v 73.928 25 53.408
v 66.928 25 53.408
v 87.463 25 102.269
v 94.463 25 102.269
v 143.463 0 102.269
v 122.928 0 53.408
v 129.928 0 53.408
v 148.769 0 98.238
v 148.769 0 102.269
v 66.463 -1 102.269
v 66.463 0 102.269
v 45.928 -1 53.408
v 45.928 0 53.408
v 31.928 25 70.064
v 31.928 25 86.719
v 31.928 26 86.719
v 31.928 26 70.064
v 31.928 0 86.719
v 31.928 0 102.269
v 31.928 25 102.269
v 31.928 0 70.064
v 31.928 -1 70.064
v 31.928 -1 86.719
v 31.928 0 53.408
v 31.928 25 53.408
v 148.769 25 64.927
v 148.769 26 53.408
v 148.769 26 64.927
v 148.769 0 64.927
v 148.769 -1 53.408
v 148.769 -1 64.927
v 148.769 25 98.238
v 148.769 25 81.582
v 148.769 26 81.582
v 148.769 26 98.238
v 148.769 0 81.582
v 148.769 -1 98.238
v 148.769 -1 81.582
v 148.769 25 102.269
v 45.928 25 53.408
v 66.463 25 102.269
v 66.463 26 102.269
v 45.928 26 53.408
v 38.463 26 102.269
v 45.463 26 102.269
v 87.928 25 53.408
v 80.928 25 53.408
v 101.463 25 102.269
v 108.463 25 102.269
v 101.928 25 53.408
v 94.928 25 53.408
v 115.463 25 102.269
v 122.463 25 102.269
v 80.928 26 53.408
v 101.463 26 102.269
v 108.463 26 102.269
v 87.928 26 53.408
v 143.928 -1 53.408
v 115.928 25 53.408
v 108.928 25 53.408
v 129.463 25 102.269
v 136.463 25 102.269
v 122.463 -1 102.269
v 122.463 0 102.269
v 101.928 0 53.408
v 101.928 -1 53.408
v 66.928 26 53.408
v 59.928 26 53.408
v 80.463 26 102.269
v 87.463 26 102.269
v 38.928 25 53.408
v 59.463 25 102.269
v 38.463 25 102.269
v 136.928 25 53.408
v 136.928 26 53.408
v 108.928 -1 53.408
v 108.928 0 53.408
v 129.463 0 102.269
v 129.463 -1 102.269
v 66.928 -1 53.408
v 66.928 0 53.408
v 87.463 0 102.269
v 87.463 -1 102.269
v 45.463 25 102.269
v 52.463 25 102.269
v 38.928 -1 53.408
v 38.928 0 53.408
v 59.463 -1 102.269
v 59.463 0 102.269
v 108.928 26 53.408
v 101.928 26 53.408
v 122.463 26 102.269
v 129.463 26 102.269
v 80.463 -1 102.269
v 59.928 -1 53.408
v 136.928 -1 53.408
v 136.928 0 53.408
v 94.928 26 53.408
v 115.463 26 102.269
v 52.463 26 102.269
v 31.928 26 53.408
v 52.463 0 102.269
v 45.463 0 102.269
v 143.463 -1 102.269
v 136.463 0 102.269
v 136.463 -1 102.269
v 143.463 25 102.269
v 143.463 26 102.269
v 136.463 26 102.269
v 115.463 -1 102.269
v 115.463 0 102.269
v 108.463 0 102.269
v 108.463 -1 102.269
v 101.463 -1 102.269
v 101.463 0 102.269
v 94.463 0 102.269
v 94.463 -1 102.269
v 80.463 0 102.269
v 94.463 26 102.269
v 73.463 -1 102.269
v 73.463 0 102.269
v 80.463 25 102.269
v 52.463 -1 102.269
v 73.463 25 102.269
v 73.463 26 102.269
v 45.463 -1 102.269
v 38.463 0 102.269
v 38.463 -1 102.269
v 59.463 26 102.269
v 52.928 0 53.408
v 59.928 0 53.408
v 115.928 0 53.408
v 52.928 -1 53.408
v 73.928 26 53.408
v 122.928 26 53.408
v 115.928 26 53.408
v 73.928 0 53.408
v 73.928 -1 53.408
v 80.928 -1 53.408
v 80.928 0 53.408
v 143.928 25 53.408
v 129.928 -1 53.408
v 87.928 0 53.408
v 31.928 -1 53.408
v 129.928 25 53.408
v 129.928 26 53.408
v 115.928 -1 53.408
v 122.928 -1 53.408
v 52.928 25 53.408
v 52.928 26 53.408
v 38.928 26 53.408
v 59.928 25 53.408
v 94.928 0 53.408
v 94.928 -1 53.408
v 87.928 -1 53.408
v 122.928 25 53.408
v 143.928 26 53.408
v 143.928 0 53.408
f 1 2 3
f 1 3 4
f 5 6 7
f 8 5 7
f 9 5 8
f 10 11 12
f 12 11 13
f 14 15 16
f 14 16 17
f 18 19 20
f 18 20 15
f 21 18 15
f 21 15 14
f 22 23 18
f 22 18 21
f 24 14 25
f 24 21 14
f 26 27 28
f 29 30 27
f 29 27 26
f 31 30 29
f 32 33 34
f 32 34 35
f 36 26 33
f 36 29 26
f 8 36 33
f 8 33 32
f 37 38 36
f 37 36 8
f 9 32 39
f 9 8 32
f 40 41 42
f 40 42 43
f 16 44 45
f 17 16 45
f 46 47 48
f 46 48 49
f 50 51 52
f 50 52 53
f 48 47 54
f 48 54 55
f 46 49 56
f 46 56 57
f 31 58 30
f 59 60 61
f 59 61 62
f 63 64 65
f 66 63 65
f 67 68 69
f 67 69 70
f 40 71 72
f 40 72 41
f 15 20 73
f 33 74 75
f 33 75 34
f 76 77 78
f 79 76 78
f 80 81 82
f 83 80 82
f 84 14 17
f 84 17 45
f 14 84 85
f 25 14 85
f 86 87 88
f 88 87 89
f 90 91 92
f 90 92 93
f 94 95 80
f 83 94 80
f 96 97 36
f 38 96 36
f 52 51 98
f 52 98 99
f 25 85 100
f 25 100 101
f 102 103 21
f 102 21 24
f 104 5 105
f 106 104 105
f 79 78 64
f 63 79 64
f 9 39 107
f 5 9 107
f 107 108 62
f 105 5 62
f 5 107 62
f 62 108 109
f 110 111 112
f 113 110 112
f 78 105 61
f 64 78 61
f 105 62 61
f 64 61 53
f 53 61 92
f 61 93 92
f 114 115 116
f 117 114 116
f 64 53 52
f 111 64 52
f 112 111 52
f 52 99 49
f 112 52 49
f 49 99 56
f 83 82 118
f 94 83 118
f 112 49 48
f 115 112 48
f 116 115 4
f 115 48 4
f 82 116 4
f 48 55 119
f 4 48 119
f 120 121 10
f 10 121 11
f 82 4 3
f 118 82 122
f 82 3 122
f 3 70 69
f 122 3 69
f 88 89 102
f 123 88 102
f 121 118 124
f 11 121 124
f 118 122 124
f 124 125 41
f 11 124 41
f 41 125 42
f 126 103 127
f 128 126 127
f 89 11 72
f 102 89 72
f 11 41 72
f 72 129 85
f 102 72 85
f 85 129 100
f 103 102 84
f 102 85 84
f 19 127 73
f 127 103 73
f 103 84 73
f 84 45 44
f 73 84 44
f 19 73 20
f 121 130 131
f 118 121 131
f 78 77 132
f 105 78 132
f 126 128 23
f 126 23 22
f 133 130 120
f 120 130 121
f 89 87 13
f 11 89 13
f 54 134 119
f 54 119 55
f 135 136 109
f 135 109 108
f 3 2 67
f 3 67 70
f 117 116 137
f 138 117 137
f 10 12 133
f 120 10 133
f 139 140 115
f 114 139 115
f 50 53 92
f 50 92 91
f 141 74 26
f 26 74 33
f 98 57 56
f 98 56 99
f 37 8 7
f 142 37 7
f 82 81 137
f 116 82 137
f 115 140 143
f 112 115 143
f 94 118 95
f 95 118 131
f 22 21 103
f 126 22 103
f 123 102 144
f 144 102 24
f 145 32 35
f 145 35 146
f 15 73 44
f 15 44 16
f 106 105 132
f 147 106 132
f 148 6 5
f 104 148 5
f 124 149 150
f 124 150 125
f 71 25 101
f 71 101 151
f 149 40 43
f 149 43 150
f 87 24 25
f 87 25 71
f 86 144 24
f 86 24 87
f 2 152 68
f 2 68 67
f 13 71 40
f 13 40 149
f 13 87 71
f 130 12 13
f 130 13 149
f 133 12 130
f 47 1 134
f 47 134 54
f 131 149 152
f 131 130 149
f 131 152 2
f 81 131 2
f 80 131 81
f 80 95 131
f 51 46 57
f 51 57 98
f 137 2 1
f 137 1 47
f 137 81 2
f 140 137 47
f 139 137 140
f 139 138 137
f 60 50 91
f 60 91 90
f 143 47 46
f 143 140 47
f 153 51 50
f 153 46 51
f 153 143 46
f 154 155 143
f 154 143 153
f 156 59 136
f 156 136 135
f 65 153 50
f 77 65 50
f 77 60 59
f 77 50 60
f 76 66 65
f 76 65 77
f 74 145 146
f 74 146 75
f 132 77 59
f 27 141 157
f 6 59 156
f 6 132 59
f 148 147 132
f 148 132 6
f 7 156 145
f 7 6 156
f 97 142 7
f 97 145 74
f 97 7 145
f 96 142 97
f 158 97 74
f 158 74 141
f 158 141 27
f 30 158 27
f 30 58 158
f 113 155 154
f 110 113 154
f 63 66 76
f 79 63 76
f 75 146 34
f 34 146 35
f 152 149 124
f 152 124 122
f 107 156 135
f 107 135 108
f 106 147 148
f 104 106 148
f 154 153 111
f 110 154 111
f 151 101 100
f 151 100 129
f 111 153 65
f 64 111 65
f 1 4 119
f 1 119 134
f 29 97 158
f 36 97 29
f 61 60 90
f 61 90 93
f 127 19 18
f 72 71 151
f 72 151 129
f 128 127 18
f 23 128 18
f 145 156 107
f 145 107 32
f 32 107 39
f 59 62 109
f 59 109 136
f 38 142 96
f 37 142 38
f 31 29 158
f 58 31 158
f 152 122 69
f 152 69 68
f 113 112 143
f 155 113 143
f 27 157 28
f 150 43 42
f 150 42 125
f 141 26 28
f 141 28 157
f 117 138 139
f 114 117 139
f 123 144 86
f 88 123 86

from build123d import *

# Parameters (mm, degrees)
F1_DEPTH      = 25
F2_DEPTH      = 1
F2_DEPTH_BACK = 26


with BuildPart() as f1:
    # F0 (on Front) → F1 (new body)
    with BuildSketch(Plane.XZ):
        Polygon((148.768574, 98.237524), (129.927574, 53.408206), (136.927574, 53.408206), (148.768574, 81.58208), align=None)
        Polygon((136.463021, 102.269206), (129.463021, 102.269206), (108.927574, 53.408206), (115.927574, 53.408206), align=None)
        Polygon((148.768574, 102.269206), (143.463021, 102.269206), (122.927574, 53.408206), (129.927574, 53.408206), (148.768574, 98.237524), align=None)
        Polygon((115.463021, 102.269206), (108.463021, 102.269206), (87.927574, 53.408206), (94.927574, 53.408206), align=None)
        Polygon((108.463021, 102.269206), (101.463021, 102.269206), (80.927574, 53.408206), (87.927574, 53.408206), align=None)
        Polygon((101.463021, 102.269206), (94.463021, 102.269206), (73.927574, 53.408206), (80.927574, 53.408206), align=None)
        Polygon((94.463021, 102.269206), (87.463021, 102.269206), (66.927574, 53.408206), (73.927574, 53.408206), align=None)
        Polygon((87.463021, 102.269206), (80.463021, 102.269206), (59.927574, 53.408206), (66.927574, 53.408206), align=None)
        Polygon((80.463021, 102.269206), (73.463021, 102.269206), (52.927574, 53.408206), (59.927574, 53.408206), align=None)
        Polygon((73.463021, 102.269206), (66.463021, 102.269206), (45.927574, 53.408206), (52.927574, 53.408206), align=None)
        Polygon((66.463021, 102.269206), (59.463021, 102.269206), (38.927574, 53.408206), (45.927574, 53.408206), align=None)
        Polygon((59.463021, 102.269206), (52.463021, 102.269206), (31.927574, 53.408206), (38.927574, 53.408206), align=None)
        Polygon((52.463021, 102.269206), (45.463021, 102.269206), (31.927574, 70.06365), (31.927574, 53.408206), align=None)
        Polygon((45.463021, 102.269206), (38.463021, 102.269206), (31.927574, 86.719095), (31.927574, 70.06365), align=None)
        Polygon((148.768574, 64.926635), (143.927574, 53.408206), (148.768574, 53.408206), align=None)
        Polygon((38.463021, 102.269206), (31.927574, 102.269206), (31.927574, 86.719095), align=None)
        Polygon((143.463021, 102.269206), (136.463021, 102.269206), (115.927574, 53.408206), (122.927574, 53.408206), align=None)
        Polygon((129.463021, 102.269206), (122.463021, 102.269206), (101.927574, 53.408206), (108.927574, 53.408206), align=None)
        Polygon((122.463021, 102.269206), (115.463021, 102.269206), (94.927574, 53.408206), (101.927574, 53.408206), align=None)
        Polygon((148.768574, 81.58208), (136.927574, 53.408206), (143.927574, 53.408206), (148.768574, 64.926635), align=None)
    extrude(amount=-F1_DEPTH)

    # F0 (on Front) → F2 (join, two sides)
    with BuildSketch(Plane.XZ) as f2_sk:
        Polygon((45.463021, 102.269206), (38.463021, 102.269206), (31.927574, 86.719095), (31.927574, 70.06365), align=None)
        Polygon((59.463021, 102.269206), (52.463021, 102.269206), (31.927574, 53.408206), (38.927574, 53.408206), align=None)
        Polygon((73.463021, 102.269206), (66.463021, 102.269206), (45.927574, 53.408206), (52.927574, 53.408206), align=None)
        Polygon((87.463021, 102.269206), (80.463021, 102.269206), (59.927574, 53.408206), (66.927574, 53.408206), align=None)
        Polygon((101.463021, 102.269206), (94.463021, 102.269206), (73.927574, 53.408206), (80.927574, 53.408206), align=None)
        Polygon((115.463021, 102.269206), (108.463021, 102.269206), (87.927574, 53.408206), (94.927574, 53.408206), align=None)
        Polygon((129.463021, 102.269206), (122.463021, 102.269206), (101.927574, 53.408206), (108.927574, 53.408206), align=None)
        Polygon((143.463021, 102.269206), (136.463021, 102.269206), (115.927574, 53.408206), (122.927574, 53.408206), align=None)
        Polygon((148.768574, 98.237524), (129.927574, 53.408206), (136.927574, 53.408206), (148.768574, 81.58208), align=None)
        Polygon((148.768574, 64.926635), (143.927574, 53.408206), (148.768574, 53.408206), align=None)
    extrude(amount=F2_DEPTH)
    extrude(f2_sk.sketch, amount=-F2_DEPTH_BACK)


solid = f1.part
